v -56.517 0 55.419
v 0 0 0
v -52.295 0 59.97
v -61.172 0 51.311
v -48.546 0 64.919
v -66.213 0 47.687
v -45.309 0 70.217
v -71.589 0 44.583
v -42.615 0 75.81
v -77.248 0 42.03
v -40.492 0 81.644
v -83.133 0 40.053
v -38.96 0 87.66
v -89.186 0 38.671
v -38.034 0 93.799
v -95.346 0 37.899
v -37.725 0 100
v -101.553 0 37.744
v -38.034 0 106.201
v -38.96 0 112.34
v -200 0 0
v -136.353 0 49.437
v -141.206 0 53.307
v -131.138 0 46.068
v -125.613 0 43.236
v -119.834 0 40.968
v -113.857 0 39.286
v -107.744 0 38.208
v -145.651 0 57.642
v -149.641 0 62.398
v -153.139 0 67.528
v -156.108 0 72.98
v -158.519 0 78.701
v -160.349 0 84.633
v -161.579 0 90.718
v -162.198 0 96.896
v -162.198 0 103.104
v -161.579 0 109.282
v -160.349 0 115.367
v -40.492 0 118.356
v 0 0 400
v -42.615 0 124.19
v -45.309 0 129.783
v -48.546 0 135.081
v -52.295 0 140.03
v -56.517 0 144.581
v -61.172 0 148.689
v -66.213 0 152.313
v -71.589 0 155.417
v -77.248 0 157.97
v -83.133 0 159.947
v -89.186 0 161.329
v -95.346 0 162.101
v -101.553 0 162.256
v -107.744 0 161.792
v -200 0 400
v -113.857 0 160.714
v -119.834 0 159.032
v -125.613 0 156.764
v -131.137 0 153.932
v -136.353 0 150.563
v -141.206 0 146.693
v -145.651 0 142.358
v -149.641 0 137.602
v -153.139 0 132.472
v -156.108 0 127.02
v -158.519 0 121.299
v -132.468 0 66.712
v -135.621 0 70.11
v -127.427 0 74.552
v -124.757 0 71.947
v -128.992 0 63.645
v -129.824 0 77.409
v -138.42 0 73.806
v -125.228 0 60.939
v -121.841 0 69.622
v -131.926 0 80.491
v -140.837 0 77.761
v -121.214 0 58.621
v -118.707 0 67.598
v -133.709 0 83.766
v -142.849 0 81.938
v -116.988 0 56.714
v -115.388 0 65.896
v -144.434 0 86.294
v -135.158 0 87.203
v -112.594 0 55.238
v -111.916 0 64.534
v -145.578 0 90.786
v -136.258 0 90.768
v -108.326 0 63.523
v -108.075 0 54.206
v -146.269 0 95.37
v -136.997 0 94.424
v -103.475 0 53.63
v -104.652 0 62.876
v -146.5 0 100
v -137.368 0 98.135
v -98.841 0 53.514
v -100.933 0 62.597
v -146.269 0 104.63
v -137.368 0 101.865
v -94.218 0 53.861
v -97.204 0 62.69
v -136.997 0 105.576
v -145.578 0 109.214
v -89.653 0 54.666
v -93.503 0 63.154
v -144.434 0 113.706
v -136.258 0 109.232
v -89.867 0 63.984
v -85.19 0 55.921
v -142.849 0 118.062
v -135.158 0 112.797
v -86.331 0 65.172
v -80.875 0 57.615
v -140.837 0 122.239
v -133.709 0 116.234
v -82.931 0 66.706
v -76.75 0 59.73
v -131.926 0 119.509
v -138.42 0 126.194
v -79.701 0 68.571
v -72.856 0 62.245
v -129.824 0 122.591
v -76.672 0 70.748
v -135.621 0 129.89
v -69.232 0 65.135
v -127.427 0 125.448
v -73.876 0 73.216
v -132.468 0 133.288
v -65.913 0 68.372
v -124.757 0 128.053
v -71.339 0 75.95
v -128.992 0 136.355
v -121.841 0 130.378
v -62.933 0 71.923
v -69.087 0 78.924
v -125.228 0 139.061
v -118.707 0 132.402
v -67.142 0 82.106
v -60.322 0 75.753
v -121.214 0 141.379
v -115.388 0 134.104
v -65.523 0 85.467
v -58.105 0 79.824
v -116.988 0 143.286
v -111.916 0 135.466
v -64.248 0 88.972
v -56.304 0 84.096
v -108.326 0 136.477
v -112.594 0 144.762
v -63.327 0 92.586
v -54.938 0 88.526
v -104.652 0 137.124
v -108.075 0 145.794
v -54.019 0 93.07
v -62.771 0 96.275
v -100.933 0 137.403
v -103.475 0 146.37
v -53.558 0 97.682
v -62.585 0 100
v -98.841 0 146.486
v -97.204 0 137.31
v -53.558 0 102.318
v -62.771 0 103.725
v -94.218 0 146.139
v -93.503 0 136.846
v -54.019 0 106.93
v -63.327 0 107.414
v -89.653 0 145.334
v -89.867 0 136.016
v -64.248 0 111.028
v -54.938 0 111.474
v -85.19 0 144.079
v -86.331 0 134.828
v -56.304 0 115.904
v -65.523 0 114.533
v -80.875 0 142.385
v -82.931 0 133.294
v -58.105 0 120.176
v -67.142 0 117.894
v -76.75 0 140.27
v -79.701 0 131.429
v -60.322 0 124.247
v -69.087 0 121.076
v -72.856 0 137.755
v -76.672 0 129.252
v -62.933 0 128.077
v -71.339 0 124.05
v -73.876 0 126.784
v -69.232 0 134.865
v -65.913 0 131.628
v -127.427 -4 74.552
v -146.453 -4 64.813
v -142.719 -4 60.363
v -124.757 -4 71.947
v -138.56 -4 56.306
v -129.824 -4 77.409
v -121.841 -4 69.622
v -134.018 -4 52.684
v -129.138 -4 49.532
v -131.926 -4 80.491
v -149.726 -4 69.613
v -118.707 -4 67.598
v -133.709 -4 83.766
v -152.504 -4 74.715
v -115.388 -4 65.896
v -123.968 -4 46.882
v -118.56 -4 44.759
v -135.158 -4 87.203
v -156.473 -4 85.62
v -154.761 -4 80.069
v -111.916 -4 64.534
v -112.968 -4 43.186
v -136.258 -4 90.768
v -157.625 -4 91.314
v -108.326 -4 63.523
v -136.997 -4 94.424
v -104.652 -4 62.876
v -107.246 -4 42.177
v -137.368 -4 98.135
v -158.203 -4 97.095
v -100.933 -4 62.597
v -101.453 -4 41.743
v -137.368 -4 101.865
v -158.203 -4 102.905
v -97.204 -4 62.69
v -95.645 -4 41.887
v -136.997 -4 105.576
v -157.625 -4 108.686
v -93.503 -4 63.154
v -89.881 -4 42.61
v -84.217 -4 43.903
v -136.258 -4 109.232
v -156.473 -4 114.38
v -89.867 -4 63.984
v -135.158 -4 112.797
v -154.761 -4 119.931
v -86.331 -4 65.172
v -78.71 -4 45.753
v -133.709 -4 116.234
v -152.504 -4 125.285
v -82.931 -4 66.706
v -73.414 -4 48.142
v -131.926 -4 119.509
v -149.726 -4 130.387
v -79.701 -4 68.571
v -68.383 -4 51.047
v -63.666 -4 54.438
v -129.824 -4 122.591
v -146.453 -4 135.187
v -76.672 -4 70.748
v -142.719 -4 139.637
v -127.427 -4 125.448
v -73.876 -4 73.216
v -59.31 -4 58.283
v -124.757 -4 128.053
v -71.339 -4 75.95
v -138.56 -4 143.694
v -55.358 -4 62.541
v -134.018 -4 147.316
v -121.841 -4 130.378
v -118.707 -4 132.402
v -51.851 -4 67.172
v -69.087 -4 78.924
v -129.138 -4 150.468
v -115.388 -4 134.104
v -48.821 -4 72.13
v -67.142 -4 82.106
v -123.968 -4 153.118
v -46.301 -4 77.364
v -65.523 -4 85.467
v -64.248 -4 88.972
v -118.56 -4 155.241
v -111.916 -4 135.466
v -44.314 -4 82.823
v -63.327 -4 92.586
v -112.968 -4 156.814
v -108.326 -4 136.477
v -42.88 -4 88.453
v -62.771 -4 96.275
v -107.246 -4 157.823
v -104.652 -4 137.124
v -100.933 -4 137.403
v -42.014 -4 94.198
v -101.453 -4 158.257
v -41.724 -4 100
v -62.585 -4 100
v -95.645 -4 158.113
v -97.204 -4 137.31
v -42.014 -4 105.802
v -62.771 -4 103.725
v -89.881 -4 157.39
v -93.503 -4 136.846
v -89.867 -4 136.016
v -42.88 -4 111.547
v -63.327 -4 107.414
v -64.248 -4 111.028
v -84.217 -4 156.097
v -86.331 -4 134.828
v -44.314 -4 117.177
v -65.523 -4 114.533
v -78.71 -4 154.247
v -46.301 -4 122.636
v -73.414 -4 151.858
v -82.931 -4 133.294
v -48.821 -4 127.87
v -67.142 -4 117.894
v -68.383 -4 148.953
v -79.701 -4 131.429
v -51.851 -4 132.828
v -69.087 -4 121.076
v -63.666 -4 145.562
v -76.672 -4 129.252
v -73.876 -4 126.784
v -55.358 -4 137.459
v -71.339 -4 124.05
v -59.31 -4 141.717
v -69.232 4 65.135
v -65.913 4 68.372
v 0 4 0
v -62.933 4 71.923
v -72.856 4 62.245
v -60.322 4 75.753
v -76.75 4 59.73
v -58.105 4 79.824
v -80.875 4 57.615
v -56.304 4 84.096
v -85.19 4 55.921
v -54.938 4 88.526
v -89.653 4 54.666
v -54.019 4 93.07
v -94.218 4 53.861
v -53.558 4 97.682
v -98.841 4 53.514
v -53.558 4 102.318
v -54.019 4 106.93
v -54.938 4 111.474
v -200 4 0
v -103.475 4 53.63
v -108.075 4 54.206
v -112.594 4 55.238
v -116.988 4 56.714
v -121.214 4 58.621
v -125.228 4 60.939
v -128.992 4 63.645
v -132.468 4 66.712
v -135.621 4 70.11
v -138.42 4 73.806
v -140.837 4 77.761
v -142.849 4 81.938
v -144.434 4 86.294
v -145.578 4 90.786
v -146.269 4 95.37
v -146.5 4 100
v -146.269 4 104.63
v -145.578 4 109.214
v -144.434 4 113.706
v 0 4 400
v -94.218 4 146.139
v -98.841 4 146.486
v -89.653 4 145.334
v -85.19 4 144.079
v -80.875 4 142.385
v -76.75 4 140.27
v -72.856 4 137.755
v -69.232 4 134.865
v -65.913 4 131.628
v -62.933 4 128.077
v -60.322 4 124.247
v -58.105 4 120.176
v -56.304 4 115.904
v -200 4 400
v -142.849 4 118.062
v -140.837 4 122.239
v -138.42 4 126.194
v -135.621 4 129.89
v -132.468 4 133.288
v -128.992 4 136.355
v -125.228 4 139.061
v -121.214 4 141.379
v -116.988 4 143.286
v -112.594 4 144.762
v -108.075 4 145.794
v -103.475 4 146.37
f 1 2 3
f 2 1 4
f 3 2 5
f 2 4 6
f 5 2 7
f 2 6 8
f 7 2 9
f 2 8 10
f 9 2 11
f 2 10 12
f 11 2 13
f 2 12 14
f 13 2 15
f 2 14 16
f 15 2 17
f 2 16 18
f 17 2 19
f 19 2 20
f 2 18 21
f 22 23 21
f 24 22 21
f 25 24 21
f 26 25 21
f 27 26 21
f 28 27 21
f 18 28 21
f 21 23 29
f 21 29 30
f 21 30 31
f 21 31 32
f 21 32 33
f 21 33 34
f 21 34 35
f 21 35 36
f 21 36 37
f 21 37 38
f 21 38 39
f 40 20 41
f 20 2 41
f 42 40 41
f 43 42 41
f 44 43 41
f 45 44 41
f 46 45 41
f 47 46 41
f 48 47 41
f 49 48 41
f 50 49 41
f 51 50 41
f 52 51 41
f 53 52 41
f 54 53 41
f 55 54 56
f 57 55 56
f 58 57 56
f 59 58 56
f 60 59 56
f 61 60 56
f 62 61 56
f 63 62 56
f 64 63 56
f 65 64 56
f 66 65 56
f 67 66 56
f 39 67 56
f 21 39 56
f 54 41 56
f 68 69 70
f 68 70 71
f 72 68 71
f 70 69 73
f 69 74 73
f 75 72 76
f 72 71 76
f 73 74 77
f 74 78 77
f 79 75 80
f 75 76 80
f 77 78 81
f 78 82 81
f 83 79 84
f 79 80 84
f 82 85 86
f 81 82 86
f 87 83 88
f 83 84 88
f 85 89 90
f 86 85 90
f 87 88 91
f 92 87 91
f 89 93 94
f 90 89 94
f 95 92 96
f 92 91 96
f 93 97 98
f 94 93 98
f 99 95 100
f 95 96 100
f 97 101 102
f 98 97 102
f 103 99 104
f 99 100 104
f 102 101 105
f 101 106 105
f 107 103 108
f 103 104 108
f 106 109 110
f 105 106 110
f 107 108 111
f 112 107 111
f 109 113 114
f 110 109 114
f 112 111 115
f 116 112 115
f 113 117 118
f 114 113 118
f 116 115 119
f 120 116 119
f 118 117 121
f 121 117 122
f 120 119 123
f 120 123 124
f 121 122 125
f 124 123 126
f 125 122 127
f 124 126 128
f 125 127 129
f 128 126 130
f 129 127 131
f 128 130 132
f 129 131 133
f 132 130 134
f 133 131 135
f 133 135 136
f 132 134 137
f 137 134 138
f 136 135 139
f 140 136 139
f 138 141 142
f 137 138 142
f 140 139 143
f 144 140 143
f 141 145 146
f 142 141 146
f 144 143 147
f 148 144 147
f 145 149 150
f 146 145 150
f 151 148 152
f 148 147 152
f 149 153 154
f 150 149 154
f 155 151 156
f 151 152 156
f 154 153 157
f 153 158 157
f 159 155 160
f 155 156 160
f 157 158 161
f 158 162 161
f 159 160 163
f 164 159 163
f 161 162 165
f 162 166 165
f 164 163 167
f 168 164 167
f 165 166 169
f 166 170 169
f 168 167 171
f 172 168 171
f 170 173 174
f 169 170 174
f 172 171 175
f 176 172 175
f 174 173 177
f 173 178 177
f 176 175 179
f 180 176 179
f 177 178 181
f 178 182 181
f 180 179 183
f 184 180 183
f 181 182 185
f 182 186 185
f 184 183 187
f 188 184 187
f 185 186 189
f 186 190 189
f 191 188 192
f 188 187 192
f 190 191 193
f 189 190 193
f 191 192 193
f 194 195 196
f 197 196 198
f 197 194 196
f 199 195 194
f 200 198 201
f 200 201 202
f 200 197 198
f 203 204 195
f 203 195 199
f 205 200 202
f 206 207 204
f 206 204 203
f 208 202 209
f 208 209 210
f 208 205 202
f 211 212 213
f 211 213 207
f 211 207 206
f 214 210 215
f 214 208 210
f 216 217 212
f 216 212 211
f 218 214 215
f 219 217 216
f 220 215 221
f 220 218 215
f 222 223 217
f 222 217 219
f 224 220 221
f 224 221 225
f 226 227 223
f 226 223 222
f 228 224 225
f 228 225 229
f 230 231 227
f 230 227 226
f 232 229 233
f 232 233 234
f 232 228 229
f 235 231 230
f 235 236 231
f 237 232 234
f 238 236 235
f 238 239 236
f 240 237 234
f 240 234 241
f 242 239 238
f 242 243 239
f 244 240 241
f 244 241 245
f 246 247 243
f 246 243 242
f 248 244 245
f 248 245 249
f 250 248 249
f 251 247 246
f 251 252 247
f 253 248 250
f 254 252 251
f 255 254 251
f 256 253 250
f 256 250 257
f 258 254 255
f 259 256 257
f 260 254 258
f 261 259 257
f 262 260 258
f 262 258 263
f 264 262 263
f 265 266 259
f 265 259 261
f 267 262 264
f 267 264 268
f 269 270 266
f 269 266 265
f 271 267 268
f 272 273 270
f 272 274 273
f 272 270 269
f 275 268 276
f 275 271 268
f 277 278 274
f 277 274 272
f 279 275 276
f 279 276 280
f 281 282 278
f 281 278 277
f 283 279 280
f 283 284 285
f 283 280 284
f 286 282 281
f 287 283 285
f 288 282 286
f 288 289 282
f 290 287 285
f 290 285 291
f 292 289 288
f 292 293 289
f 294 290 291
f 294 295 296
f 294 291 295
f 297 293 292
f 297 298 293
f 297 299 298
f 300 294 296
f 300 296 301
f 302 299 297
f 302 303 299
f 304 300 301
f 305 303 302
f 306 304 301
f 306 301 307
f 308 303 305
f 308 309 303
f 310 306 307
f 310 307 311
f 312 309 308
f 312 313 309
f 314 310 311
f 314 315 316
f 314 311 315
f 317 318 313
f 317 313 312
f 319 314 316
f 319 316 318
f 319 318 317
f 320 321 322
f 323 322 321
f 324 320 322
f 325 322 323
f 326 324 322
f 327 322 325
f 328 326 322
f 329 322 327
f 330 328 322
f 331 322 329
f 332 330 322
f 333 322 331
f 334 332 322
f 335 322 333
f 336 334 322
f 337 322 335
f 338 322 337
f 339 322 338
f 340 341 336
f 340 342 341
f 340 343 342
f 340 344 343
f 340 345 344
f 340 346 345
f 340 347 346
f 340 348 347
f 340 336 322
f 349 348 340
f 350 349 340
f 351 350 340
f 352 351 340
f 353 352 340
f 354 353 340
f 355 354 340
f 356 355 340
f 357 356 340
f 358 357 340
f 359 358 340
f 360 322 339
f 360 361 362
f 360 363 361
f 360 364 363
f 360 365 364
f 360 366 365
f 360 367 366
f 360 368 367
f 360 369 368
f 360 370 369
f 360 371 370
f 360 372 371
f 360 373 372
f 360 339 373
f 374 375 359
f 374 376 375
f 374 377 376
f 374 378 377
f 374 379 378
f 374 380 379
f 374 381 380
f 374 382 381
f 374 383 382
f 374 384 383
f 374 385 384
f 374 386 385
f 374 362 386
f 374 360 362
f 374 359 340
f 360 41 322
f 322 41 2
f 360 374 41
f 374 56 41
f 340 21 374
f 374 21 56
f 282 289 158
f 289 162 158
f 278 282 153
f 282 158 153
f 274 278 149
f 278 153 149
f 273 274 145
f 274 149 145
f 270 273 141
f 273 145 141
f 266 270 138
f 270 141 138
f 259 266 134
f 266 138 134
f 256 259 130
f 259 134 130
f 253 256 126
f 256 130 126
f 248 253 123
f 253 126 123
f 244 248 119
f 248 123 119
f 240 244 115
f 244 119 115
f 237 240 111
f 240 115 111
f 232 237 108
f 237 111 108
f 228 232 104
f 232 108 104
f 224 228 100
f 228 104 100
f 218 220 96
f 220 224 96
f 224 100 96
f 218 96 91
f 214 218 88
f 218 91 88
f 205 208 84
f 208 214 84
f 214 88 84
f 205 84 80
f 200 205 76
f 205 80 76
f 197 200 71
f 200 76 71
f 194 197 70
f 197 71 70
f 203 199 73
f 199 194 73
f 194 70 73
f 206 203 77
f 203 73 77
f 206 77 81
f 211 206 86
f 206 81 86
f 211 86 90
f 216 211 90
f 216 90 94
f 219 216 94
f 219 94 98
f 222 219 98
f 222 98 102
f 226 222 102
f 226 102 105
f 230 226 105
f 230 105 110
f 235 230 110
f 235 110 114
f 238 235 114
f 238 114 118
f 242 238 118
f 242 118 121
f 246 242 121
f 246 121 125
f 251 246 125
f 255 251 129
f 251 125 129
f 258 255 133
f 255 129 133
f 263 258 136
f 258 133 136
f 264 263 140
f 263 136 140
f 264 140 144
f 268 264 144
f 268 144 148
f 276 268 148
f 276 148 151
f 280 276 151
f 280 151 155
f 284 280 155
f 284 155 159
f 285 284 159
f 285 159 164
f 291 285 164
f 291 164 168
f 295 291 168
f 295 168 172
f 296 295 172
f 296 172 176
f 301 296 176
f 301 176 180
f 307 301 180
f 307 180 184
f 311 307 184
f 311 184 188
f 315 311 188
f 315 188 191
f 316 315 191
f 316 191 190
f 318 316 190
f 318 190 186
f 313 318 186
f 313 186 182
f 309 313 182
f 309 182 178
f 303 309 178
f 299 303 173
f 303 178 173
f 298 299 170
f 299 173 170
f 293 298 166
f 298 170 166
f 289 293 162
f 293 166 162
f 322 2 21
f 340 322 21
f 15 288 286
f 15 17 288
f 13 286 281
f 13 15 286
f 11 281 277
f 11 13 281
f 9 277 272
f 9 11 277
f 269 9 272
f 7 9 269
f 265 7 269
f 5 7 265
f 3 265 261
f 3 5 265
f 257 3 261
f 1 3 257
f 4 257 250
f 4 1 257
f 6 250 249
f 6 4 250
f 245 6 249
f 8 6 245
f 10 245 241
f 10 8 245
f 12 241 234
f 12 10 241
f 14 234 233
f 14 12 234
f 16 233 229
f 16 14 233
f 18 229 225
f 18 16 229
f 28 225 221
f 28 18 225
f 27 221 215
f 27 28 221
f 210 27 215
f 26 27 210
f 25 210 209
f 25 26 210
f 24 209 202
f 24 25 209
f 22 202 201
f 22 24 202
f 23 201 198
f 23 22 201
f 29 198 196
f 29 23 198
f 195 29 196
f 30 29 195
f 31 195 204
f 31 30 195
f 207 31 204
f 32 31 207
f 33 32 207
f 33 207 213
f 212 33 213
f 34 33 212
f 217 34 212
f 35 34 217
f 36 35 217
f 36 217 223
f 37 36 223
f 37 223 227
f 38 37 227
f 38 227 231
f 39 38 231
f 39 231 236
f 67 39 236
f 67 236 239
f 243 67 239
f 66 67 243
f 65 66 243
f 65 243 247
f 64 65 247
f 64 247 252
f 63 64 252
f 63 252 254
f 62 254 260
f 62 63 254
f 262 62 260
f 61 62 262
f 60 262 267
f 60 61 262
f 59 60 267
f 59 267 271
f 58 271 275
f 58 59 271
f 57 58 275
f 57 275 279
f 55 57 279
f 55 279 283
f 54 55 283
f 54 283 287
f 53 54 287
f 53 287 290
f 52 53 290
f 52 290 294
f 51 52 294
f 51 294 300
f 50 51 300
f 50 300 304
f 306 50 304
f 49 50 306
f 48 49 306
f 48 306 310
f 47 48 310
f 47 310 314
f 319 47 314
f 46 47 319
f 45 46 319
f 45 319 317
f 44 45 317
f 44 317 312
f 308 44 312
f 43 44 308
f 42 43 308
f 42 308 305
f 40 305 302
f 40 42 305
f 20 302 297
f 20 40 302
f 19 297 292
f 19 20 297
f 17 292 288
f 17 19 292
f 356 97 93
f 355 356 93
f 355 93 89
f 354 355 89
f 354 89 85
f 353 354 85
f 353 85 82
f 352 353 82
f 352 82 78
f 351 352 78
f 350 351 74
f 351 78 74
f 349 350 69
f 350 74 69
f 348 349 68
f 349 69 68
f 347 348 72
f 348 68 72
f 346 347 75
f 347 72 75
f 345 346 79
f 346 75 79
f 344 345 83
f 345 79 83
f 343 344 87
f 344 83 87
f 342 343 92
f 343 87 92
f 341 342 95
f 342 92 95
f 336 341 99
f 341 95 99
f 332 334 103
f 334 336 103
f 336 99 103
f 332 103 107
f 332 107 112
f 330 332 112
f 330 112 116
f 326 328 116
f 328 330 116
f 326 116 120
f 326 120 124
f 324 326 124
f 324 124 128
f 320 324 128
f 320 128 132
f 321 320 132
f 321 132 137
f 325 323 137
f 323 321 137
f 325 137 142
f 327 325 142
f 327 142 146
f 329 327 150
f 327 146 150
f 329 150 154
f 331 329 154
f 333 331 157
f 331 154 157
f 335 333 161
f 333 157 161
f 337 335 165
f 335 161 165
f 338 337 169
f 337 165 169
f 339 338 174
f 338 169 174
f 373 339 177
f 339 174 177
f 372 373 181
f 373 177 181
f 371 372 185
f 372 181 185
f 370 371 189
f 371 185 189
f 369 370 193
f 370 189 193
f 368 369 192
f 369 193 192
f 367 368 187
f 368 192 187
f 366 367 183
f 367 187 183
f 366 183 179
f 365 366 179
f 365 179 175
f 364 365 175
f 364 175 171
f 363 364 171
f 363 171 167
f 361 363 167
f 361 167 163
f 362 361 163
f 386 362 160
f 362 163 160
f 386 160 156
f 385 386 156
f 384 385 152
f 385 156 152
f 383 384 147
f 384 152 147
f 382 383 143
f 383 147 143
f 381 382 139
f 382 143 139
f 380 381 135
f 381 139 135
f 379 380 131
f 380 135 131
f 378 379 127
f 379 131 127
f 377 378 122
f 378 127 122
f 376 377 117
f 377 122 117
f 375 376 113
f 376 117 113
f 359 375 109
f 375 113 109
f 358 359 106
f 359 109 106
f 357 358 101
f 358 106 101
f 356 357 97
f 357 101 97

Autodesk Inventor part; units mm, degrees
ref_plane "YZ Plane" through (0, 0, 0) normal (1, 0, 0) x (0, 1, 0)
ref_plane "XZ Plane" through (0, 0, 0) normal (0, 1, 0) x (-1, 0, 0)
ref_plane "XY Plane" through (0, 0, 0) normal (0, 0, 1) x (1, 0, 0)
sketch "Эскиз1" plane through (0, 0, 0) normal (0, 1, 0) x (-1, 0, 0)
  line L0 (0, 0) -> (200, 0)
  line L1 (200, 0) -> (200, 400)
  line L2 (200, 400) -> (0, 400)
  line L3 (0, 400) -> (0, 0)
  circle A0 centre (100, 100) radius 46.5
  point P0 (100, 0)
  dimension "d0" = 200
  dimension "d1" = 400
  dimension "d2" = 100
  dimension "d3" = 93
extrude "Выдавливание1" add sketch "Эскиз1" along normal blind 4
sketch "Эскиз2" plane through (0, 0, 0) normal (0, -1, 0) x (1, 0, 0)
  circle A0 centre (-100, 100) radius 46.5 projected
  circle A1 centre (-100, 100) radius 58.2755
  circle A2 centre (-100, 100) radius 37.4147
  point P0 (0, 0)
extrude "Выдавливание2" add sketch "Эскиз2" along normal blind 4 contours A0 | A1
chamfer "Фаска1" distance 4 angle 45 1 edges at (-158.2755, 0, 100)
properties part number "типа танк"
